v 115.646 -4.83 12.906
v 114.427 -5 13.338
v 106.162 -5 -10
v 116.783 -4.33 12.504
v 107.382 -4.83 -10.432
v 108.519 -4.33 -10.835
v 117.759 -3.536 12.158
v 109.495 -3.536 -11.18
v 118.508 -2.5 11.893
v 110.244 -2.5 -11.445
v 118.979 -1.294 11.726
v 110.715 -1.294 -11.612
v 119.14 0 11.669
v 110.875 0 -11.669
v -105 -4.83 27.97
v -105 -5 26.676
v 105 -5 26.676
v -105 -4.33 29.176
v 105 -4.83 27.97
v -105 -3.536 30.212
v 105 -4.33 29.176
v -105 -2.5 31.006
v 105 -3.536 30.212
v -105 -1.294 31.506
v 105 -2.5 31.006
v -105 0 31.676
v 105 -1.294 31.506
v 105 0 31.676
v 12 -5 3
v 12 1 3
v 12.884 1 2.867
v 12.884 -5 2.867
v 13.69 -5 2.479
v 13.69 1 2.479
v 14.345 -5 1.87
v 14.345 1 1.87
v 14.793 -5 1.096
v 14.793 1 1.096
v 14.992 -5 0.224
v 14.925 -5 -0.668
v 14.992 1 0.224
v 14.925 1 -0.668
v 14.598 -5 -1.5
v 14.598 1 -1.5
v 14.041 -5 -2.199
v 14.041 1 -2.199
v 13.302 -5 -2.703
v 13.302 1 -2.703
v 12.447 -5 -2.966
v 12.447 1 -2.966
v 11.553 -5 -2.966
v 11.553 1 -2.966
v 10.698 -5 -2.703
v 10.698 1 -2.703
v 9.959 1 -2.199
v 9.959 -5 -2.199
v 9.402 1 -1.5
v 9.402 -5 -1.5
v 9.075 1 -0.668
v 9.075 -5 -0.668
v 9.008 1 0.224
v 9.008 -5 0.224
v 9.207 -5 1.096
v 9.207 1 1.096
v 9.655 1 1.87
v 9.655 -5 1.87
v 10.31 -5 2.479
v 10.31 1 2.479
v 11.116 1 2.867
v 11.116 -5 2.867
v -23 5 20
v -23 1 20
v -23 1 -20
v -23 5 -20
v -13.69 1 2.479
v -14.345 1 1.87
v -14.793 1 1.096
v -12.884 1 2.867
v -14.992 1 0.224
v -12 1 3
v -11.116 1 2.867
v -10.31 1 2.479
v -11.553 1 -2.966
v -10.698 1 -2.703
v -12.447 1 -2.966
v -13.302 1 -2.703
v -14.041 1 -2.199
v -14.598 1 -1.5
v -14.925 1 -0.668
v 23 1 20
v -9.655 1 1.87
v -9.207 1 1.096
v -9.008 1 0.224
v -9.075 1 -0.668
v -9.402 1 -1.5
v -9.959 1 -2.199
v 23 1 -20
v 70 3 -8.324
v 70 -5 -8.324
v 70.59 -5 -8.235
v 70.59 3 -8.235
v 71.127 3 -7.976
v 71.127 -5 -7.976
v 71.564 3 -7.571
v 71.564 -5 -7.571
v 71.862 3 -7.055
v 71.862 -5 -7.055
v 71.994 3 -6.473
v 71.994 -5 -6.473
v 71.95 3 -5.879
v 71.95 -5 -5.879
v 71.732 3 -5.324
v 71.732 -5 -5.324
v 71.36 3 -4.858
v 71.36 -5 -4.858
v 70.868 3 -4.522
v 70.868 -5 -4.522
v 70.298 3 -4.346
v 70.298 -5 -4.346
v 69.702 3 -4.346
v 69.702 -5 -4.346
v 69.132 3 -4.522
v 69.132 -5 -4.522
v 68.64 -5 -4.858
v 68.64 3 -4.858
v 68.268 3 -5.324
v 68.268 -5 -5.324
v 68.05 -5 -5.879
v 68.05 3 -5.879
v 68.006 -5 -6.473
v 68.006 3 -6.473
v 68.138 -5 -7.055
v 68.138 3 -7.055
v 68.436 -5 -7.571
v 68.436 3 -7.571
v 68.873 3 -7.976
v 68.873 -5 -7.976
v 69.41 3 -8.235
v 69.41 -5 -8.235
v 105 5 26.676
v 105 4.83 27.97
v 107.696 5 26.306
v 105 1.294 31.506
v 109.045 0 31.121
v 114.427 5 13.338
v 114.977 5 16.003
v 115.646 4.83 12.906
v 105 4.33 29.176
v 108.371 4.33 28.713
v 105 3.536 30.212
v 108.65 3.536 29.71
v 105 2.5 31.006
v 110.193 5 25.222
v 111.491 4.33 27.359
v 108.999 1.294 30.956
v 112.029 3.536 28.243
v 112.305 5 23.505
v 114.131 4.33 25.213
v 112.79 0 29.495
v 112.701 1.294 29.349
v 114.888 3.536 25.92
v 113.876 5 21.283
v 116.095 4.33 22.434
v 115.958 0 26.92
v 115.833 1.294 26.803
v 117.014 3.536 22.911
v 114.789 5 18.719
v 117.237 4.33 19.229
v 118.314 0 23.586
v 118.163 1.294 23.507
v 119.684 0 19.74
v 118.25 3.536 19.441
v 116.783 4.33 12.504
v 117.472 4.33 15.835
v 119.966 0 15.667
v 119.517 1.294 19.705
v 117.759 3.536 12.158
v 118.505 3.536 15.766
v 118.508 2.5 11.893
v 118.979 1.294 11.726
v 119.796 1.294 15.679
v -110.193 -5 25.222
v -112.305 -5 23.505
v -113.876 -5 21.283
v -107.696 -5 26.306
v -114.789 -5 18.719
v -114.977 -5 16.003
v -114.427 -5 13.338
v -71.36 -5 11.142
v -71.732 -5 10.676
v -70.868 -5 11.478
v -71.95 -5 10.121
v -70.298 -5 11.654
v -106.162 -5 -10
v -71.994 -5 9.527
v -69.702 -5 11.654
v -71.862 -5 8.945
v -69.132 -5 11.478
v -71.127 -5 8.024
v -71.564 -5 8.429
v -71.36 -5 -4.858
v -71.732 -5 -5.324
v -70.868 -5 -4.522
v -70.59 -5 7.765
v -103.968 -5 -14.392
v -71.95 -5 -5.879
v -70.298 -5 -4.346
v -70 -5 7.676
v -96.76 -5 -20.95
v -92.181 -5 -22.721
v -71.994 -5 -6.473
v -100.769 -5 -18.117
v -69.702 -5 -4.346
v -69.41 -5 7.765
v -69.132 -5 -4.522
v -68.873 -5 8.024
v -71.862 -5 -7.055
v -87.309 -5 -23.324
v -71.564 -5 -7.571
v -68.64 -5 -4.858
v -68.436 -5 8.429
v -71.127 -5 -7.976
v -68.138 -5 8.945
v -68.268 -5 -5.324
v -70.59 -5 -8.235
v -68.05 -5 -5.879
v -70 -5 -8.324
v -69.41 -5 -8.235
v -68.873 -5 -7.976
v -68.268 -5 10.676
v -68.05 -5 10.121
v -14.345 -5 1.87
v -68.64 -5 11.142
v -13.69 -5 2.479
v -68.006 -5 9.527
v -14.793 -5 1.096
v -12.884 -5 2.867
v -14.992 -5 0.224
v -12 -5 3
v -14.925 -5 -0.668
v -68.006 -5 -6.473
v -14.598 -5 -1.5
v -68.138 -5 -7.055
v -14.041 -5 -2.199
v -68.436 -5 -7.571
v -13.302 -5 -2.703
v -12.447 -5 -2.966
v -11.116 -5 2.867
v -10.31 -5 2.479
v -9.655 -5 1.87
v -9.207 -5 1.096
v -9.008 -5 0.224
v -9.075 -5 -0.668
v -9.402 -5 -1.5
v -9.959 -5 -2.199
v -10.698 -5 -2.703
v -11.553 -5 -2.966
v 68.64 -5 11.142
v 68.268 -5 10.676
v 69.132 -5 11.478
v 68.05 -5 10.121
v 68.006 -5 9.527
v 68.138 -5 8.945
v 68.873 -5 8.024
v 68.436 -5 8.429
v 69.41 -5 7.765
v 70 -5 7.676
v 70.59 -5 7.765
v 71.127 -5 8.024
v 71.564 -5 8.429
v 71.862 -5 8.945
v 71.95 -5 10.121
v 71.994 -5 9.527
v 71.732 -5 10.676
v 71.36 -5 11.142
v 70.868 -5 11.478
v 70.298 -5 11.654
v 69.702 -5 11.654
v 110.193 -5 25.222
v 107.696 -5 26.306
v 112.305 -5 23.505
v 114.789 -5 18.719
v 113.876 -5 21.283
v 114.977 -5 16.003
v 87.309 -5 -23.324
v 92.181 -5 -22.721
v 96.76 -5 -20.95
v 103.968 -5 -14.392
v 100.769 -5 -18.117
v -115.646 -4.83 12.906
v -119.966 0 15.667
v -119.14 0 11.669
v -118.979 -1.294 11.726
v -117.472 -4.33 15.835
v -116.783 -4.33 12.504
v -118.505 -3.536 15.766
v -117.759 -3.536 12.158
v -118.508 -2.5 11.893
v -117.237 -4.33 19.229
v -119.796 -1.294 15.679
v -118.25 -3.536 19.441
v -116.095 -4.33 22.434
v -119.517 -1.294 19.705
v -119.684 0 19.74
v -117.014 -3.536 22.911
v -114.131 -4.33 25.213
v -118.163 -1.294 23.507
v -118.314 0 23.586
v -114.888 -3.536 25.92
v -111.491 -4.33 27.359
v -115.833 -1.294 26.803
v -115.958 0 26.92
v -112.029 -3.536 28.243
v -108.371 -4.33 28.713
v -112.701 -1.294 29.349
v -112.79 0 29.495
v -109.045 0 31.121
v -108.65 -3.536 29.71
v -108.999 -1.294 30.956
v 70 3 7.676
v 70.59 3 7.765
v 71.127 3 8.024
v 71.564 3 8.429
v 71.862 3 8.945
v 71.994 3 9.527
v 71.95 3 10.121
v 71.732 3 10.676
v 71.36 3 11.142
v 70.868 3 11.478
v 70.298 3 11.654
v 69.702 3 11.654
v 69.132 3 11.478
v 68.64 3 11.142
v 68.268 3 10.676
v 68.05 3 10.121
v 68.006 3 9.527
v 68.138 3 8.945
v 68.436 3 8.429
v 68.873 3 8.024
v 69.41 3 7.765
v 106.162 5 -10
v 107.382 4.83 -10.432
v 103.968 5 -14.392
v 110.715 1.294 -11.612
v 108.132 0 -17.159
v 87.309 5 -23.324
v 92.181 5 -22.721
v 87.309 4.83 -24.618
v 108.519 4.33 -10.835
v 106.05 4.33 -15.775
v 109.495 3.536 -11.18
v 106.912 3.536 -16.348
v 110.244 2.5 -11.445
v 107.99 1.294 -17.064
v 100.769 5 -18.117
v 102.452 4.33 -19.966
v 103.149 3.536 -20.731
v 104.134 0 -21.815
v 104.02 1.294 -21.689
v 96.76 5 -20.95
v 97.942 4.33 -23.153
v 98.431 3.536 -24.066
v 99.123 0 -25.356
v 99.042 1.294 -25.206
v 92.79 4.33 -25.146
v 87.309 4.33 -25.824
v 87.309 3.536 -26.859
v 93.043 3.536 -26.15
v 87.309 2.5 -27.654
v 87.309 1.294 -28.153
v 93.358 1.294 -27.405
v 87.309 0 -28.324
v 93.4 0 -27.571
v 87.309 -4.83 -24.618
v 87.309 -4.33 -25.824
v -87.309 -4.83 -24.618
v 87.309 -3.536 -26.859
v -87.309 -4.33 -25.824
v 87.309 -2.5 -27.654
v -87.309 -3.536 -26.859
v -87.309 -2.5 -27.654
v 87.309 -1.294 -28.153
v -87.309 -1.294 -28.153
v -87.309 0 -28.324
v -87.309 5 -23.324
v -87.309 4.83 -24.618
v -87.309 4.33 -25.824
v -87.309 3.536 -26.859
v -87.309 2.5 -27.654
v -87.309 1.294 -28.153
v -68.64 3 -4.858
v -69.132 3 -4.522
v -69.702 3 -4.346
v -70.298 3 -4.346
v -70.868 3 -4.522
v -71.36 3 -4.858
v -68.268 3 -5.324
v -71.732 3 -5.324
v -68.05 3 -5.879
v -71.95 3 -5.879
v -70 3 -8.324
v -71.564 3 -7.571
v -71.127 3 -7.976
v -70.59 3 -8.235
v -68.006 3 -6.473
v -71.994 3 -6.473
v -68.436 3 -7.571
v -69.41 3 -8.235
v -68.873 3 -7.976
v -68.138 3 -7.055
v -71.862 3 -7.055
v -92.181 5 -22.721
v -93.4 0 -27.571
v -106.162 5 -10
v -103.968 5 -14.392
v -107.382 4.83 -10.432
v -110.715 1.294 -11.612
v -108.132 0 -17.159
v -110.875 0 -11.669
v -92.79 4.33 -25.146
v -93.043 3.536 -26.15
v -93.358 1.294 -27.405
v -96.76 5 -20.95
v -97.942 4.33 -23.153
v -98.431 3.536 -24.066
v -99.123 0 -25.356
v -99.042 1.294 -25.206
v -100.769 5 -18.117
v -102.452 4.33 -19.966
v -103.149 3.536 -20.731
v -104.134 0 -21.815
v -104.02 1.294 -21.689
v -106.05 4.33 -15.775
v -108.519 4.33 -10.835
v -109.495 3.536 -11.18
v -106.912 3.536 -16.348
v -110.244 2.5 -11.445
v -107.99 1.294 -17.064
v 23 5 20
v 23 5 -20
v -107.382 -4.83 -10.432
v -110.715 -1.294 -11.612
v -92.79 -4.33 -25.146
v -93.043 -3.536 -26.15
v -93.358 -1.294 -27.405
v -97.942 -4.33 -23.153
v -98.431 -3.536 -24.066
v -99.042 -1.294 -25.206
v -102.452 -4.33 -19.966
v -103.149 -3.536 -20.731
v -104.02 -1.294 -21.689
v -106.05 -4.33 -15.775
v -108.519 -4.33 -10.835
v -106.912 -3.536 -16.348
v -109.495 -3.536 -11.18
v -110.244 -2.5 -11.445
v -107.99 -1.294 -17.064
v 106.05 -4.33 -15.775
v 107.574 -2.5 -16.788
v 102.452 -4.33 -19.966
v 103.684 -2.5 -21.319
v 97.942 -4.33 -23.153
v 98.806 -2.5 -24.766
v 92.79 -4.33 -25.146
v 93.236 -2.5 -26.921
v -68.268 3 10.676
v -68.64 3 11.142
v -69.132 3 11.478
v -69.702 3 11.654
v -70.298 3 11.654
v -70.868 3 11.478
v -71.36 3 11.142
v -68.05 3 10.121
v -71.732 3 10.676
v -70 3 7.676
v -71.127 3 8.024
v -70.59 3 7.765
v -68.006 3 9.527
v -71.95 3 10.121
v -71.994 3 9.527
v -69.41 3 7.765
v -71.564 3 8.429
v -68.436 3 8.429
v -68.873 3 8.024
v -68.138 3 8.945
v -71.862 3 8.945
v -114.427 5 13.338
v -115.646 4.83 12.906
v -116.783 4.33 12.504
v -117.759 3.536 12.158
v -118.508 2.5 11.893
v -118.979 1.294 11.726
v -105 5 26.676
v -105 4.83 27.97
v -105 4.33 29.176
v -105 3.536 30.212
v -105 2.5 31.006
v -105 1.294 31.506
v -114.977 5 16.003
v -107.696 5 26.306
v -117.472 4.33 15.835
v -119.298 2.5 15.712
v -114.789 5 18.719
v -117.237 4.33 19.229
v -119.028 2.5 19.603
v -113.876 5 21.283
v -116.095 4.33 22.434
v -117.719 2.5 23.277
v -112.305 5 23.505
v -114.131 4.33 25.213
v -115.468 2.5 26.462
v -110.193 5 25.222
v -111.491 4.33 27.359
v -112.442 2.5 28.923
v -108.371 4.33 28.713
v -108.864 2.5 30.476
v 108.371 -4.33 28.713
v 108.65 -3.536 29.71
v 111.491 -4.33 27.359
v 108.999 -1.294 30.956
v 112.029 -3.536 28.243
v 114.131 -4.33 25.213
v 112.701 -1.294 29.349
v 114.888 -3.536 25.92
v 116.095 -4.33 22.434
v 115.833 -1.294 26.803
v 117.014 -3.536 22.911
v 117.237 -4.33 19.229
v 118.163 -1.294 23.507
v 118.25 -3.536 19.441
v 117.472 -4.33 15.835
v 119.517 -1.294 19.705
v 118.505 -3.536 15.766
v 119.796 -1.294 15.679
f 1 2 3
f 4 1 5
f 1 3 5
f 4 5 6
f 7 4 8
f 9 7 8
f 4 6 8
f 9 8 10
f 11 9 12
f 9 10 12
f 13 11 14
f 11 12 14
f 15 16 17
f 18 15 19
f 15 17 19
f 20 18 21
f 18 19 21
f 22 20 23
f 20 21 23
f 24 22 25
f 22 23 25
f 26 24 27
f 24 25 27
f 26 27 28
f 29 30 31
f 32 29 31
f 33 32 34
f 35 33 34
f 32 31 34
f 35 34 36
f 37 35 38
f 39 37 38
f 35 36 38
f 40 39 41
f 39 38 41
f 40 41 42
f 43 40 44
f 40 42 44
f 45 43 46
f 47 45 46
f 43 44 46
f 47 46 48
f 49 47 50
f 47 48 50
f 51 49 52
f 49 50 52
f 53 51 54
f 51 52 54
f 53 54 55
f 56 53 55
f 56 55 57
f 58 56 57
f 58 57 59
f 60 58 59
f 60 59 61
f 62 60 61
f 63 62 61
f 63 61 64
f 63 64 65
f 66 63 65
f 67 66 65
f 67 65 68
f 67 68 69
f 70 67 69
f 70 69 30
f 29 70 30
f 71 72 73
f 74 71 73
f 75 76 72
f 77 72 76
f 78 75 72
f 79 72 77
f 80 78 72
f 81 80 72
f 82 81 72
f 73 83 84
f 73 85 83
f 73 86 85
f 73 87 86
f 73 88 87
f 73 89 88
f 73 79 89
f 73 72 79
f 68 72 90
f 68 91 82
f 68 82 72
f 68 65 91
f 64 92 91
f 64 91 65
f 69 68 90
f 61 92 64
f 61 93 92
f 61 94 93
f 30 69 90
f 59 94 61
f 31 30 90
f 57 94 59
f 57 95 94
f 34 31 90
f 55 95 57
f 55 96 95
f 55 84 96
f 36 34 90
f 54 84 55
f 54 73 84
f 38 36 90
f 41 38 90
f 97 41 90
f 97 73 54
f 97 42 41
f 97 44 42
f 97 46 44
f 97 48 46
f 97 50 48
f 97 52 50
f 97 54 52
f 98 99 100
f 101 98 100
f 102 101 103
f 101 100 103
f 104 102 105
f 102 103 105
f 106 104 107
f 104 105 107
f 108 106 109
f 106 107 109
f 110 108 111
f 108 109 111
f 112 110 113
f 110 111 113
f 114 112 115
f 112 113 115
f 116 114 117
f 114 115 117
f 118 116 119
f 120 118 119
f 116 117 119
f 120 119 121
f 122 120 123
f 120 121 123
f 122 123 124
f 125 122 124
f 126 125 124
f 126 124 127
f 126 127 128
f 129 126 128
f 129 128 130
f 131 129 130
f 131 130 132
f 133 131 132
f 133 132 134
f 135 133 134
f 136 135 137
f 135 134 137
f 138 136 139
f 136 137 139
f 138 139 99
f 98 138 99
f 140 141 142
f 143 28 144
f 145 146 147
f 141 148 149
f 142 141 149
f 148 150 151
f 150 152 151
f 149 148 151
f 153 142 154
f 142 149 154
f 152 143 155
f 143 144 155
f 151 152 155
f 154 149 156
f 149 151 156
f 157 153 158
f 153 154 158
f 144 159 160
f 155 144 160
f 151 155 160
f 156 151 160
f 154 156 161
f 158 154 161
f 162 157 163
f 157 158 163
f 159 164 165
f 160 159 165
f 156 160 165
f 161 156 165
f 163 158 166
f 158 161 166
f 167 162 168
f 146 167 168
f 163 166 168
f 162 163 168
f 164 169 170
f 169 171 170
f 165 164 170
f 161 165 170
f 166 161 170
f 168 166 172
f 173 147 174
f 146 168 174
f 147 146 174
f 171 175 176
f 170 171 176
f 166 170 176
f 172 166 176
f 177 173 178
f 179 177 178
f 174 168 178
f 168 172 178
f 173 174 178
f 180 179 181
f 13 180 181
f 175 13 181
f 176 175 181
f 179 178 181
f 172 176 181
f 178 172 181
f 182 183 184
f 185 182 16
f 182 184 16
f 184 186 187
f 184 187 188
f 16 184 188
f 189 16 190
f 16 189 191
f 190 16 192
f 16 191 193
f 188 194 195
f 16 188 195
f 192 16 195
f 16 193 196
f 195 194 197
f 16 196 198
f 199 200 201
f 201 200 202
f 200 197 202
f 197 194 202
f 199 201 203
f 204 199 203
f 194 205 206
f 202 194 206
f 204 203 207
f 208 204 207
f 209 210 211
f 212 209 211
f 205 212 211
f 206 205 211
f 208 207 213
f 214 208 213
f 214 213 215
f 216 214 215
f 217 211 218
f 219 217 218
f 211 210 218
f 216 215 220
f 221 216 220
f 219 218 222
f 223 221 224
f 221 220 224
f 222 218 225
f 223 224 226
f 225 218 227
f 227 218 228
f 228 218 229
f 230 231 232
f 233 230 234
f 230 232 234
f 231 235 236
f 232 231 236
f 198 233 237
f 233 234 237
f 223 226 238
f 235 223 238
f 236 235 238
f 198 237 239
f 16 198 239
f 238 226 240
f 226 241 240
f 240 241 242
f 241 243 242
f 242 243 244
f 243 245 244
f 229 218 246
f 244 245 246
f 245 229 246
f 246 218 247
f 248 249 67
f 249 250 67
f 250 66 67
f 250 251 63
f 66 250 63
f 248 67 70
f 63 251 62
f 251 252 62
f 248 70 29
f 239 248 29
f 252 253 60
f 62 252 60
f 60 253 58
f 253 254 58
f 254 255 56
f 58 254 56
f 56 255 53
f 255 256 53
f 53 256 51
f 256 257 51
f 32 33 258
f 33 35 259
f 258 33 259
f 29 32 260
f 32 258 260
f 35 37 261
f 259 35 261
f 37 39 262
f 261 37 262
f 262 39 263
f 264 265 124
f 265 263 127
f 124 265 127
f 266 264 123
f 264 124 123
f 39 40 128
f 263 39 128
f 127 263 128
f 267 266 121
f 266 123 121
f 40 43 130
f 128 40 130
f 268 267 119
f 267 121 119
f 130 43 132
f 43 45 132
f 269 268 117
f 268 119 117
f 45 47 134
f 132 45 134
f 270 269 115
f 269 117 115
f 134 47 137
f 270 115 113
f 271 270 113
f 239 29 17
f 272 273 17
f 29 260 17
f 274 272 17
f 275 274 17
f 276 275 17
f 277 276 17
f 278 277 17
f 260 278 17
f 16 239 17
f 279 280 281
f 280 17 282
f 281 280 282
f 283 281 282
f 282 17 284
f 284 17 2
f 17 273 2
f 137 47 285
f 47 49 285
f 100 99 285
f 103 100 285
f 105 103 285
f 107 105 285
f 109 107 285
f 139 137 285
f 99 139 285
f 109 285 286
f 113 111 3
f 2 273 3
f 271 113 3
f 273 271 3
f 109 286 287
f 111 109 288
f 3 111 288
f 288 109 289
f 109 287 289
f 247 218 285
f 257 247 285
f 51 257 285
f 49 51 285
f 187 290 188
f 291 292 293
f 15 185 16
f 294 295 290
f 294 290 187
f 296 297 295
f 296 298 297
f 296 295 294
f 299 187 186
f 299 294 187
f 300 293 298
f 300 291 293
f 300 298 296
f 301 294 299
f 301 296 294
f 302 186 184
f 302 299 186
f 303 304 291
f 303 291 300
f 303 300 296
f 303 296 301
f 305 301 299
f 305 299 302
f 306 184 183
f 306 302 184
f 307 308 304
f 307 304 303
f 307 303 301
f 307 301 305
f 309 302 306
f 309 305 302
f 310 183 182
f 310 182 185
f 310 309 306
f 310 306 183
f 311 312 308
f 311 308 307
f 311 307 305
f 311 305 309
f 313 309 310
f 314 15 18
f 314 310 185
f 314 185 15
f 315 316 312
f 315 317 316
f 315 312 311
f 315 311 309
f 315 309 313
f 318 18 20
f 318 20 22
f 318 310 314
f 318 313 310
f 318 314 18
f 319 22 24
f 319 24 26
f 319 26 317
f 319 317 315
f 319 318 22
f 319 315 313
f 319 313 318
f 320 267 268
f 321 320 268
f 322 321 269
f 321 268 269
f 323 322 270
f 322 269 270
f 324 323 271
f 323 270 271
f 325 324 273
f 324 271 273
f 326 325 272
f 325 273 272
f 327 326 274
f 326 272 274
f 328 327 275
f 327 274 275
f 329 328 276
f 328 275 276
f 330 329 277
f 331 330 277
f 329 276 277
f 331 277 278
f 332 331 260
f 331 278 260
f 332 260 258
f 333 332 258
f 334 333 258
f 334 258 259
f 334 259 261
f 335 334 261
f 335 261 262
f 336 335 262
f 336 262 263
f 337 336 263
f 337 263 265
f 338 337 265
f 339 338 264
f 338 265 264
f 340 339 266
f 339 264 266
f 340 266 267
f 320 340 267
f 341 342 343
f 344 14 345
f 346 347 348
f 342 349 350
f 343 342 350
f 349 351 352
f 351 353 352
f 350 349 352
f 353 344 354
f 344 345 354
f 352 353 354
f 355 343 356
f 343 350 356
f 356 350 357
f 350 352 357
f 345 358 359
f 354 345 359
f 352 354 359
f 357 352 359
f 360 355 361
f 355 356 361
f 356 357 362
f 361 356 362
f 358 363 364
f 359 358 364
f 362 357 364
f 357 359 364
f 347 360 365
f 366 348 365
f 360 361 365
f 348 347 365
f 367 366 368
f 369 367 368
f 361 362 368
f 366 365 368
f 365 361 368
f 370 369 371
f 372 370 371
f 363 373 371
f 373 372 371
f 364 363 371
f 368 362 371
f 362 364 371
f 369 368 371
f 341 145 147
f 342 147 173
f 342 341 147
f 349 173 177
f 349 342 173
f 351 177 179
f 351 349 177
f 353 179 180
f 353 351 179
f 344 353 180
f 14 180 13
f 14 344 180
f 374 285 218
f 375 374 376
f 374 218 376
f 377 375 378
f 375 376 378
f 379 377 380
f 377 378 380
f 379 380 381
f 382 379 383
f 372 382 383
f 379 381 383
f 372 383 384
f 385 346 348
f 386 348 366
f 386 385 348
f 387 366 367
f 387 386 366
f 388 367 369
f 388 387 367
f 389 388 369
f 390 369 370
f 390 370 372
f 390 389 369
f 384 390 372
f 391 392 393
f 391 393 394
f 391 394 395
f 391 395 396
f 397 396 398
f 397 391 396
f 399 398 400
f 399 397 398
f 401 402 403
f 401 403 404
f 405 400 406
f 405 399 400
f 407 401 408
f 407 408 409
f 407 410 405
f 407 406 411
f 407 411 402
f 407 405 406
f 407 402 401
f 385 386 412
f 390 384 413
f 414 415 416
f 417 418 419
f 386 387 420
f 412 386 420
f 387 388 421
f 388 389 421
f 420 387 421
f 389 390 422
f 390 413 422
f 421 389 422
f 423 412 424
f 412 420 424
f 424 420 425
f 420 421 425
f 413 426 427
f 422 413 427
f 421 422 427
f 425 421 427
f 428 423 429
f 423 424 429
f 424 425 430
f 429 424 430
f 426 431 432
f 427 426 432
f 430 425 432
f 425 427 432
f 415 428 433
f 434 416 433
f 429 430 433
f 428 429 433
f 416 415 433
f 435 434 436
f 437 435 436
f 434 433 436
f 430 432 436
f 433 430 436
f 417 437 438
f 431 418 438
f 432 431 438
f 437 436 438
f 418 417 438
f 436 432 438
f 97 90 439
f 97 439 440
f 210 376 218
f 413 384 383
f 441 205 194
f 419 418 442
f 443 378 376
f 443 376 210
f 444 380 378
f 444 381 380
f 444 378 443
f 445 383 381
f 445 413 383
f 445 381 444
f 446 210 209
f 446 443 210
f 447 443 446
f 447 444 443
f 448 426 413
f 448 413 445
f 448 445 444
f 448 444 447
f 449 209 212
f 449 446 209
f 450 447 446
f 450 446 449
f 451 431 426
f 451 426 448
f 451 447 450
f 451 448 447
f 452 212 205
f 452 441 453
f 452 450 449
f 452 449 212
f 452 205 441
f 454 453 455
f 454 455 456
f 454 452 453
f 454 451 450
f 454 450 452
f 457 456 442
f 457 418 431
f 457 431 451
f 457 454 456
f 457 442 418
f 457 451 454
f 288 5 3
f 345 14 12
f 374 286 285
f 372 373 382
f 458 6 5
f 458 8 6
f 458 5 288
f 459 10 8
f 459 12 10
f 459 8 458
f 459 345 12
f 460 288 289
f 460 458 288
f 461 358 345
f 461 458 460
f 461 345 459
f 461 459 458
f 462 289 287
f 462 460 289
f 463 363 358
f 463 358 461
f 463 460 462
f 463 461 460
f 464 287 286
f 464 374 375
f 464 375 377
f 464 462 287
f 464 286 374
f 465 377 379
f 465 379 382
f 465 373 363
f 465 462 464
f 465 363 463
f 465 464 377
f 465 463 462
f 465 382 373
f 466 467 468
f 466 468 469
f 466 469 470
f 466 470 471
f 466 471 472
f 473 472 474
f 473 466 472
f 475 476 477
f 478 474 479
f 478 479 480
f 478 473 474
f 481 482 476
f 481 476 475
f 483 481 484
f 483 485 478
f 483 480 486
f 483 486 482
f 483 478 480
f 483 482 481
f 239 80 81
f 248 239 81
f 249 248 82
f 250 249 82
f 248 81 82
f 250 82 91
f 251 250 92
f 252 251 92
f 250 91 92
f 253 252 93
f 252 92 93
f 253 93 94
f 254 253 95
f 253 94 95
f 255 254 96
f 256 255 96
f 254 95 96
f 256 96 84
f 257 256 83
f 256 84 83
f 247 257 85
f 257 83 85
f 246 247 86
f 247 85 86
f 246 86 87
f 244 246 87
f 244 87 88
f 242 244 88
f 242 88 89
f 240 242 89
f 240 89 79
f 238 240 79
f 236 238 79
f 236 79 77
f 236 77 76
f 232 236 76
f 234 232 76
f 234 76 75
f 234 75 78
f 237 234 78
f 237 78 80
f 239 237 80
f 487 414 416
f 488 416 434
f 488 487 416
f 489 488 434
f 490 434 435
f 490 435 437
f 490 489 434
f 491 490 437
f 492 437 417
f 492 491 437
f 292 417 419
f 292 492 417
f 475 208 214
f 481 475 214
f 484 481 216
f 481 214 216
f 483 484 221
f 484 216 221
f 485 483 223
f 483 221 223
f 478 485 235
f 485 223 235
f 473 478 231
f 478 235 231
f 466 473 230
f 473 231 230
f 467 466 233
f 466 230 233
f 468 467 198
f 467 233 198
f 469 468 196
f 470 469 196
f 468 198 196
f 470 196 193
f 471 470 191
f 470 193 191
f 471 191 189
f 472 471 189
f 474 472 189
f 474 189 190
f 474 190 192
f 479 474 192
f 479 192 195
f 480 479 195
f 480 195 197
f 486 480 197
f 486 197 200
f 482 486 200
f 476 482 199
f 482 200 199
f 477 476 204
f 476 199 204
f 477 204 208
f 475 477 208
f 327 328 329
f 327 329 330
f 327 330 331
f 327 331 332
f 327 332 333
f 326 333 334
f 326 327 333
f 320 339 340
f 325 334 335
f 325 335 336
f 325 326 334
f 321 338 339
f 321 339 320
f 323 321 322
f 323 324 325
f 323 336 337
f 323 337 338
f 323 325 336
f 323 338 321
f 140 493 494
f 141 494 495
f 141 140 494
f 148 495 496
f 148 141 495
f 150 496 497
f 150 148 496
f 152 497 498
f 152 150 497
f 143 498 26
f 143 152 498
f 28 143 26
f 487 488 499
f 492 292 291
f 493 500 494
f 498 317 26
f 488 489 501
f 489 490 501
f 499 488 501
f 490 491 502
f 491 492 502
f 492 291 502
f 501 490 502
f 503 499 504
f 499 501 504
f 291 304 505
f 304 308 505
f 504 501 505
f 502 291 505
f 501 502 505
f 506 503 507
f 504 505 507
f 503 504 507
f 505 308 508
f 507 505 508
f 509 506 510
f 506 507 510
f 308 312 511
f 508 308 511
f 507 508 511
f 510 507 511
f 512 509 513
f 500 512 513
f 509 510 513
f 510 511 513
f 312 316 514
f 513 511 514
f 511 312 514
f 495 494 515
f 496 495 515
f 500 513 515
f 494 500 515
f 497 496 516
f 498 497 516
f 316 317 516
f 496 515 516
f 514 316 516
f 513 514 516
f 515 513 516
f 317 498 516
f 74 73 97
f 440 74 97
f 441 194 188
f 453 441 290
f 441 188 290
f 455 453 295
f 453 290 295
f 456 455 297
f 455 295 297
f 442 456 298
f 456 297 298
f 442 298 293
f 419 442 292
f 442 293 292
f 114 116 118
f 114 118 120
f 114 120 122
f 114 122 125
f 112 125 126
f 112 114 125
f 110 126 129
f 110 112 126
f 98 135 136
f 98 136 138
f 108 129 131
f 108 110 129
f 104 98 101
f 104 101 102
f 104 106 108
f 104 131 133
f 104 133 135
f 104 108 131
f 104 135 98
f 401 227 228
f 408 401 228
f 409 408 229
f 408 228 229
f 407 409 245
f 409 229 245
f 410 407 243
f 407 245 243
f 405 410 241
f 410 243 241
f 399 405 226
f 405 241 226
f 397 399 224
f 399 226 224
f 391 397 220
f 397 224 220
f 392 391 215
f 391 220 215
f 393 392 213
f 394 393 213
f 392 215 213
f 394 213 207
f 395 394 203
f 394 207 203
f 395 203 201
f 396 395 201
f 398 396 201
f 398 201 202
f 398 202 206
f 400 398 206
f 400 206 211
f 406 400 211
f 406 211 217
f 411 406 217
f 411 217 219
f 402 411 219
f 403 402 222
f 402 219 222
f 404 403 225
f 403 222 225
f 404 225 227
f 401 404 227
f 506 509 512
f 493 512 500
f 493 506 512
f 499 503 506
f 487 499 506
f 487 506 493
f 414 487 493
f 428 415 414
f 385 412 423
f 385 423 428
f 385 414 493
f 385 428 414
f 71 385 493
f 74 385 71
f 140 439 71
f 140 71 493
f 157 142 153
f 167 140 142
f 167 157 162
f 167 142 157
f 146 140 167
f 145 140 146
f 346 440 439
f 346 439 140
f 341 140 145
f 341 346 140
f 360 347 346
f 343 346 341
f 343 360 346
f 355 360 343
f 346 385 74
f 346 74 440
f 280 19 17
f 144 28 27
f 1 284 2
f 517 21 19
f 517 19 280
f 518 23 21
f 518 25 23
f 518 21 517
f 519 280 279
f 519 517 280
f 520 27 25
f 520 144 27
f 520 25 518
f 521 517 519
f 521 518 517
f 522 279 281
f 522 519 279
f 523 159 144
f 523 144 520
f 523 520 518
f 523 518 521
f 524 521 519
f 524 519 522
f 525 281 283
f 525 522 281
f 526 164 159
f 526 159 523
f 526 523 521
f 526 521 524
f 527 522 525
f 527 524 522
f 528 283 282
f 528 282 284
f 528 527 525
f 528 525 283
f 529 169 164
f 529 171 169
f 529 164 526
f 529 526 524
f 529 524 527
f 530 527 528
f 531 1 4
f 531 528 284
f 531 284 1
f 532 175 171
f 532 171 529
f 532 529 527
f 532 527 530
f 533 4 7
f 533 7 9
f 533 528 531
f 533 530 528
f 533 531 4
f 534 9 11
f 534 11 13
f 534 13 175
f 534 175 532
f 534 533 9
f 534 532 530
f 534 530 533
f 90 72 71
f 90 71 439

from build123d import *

# Parameters (mm, degrees)
BOSS_EXTRUDE1_DEPTH     = 5
CUT_EXTRUDE1_DEPTH      = 125.512560278
CUT_EXTRUDE1_DEPTH_BACK = 4
SKETCH2_W               = 46
SKETCH2_H               = 40
SKETCH3_R               = 3
CUT_EXTRUDE2_DEPTH      = 125.25529231
SKETCH4_R               = 2
CUT_EXTRUDE3_DEPTH      = 8
FILLET1_R               = 5


with BuildPart() as part:
    # Sketch1 → Boss-Extrude1 (new, symmetric)
    with BuildSketch(Plane(origin=(0, 0, 0), x_dir=(1, 0, 0), z_dir=(0, 1, 0))):
        with BuildLine():
            Line((-105, -31.676137185), (105, -31.676137185))
            ThreePointArc((105, -31.676137185), (117.249623327, -25.333315035), (119.139622366, -11.669034296))
            Line((119.139622366, -11.669034296), (110.875178831, 11.669034296))
            ThreePointArc((110.875178831, 11.669034296), (101.737771304, 23.739901694), (87.309141554, 28.323862815))
            Line((87.309141554, 28.323862815), (-87.309141554, 28.323862815))
            ThreePointArc((-87.309141554, 28.323862815), (-101.737771304, 23.739901694), (-110.875178831, 11.669034296))
            Line((-110.875178831, 11.669034296), (-119.139622366, -11.669034296))
            ThreePointArc((-119.139622366, -11.669034296), (-117.249623327, -25.333315035), (-105, -31.676137185))
        make_face()
    extrude(amount=BOSS_EXTRUDE1_DEPTH, both=True)

    # Sketch2 → Cut-Extrude1 (cut, two sides: drawn at the far end of the back side and taken through both)
    with BuildSketch(Plane(origin=(0, 5, 0), x_dir=(1, 0, 0), z_dir=(0, 1, 0)).offset(-CUT_EXTRUDE1_DEPTH_BACK)):
        Rectangle(SKETCH2_W, SKETCH2_H)
    extrude(amount=CUT_EXTRUDE1_DEPTH + CUT_EXTRUDE1_DEPTH_BACK, mode=Mode.SUBTRACT)

    # Sketch3 → Cut-Extrude2 (cut, through all)
    with BuildSketch(Plane(origin=(0, 1, 0), x_dir=(1, 0, 0), z_dir=(0, 1, 0))):
        with Locations(Location((12, 0, 0), (0, 0, 270))):
            Circle(SKETCH3_R)
        with Locations(Location((-12, 0, 0), (0, 0, 270))):
            Circle(SKETCH3_R)
    extrude(amount=-CUT_EXTRUDE2_DEPTH, mode=Mode.SUBTRACT)

    # Sketch4 → Cut-Extrude3 (cut)
    with BuildSketch(Plane.XZ.offset(5)):
        with Locations(Location((-70, 9.676137185, 0), (0, 0, 270))):
            Circle(SKETCH4_R)
        with Locations(Location((-70, -6.323862815, 0), (0, 0, 270))):
            Circle(SKETCH4_R)
        with Locations(Location((70, -6.323862815, 0), (0, 0, 270))):
            Circle(SKETCH4_R)
        with Locations(Location((70, 9.676137185, 0), (0, 0, 270))):
            Circle(SKETCH4_R)
    extrude(amount=-CUT_EXTRUDE3_DEPTH, mode=Mode.SUBTRACT)

    # Fillet1
    fillet1_edges = [part.edges().sort_by_distance(p)[0] for p in [
        (101.737771304, -5, -23.739901694),
        (115.007400599, -5, 0),
        (117.249623327, -5, 25.333315035),
        (0, -5, 31.676137185),
        (-117.249623327, -5, 25.333315035),
        (-115.007400599, -5, 0),
        (-101.737771304, -5, -23.739901694),
        (-117.249623327, 5, 25.333315035),
        (-115.007400599, 5, 0),
        (-101.737771304, 5, -23.739901694),
        (0, 5, -28.323862815),
        (101.737771304, 5, -23.739901694),
        (115.007400599, 5, 0),
        (117.249623327, 5, 25.333315035),
        (0, -5, -28.323862815),
        (0, 5, 31.676137185),
    ]]
    fillet(fillet1_edges, radius=FILLET1_R - 0.0001)  # a hair under: the kernel refuses the full size


solid = part.part
